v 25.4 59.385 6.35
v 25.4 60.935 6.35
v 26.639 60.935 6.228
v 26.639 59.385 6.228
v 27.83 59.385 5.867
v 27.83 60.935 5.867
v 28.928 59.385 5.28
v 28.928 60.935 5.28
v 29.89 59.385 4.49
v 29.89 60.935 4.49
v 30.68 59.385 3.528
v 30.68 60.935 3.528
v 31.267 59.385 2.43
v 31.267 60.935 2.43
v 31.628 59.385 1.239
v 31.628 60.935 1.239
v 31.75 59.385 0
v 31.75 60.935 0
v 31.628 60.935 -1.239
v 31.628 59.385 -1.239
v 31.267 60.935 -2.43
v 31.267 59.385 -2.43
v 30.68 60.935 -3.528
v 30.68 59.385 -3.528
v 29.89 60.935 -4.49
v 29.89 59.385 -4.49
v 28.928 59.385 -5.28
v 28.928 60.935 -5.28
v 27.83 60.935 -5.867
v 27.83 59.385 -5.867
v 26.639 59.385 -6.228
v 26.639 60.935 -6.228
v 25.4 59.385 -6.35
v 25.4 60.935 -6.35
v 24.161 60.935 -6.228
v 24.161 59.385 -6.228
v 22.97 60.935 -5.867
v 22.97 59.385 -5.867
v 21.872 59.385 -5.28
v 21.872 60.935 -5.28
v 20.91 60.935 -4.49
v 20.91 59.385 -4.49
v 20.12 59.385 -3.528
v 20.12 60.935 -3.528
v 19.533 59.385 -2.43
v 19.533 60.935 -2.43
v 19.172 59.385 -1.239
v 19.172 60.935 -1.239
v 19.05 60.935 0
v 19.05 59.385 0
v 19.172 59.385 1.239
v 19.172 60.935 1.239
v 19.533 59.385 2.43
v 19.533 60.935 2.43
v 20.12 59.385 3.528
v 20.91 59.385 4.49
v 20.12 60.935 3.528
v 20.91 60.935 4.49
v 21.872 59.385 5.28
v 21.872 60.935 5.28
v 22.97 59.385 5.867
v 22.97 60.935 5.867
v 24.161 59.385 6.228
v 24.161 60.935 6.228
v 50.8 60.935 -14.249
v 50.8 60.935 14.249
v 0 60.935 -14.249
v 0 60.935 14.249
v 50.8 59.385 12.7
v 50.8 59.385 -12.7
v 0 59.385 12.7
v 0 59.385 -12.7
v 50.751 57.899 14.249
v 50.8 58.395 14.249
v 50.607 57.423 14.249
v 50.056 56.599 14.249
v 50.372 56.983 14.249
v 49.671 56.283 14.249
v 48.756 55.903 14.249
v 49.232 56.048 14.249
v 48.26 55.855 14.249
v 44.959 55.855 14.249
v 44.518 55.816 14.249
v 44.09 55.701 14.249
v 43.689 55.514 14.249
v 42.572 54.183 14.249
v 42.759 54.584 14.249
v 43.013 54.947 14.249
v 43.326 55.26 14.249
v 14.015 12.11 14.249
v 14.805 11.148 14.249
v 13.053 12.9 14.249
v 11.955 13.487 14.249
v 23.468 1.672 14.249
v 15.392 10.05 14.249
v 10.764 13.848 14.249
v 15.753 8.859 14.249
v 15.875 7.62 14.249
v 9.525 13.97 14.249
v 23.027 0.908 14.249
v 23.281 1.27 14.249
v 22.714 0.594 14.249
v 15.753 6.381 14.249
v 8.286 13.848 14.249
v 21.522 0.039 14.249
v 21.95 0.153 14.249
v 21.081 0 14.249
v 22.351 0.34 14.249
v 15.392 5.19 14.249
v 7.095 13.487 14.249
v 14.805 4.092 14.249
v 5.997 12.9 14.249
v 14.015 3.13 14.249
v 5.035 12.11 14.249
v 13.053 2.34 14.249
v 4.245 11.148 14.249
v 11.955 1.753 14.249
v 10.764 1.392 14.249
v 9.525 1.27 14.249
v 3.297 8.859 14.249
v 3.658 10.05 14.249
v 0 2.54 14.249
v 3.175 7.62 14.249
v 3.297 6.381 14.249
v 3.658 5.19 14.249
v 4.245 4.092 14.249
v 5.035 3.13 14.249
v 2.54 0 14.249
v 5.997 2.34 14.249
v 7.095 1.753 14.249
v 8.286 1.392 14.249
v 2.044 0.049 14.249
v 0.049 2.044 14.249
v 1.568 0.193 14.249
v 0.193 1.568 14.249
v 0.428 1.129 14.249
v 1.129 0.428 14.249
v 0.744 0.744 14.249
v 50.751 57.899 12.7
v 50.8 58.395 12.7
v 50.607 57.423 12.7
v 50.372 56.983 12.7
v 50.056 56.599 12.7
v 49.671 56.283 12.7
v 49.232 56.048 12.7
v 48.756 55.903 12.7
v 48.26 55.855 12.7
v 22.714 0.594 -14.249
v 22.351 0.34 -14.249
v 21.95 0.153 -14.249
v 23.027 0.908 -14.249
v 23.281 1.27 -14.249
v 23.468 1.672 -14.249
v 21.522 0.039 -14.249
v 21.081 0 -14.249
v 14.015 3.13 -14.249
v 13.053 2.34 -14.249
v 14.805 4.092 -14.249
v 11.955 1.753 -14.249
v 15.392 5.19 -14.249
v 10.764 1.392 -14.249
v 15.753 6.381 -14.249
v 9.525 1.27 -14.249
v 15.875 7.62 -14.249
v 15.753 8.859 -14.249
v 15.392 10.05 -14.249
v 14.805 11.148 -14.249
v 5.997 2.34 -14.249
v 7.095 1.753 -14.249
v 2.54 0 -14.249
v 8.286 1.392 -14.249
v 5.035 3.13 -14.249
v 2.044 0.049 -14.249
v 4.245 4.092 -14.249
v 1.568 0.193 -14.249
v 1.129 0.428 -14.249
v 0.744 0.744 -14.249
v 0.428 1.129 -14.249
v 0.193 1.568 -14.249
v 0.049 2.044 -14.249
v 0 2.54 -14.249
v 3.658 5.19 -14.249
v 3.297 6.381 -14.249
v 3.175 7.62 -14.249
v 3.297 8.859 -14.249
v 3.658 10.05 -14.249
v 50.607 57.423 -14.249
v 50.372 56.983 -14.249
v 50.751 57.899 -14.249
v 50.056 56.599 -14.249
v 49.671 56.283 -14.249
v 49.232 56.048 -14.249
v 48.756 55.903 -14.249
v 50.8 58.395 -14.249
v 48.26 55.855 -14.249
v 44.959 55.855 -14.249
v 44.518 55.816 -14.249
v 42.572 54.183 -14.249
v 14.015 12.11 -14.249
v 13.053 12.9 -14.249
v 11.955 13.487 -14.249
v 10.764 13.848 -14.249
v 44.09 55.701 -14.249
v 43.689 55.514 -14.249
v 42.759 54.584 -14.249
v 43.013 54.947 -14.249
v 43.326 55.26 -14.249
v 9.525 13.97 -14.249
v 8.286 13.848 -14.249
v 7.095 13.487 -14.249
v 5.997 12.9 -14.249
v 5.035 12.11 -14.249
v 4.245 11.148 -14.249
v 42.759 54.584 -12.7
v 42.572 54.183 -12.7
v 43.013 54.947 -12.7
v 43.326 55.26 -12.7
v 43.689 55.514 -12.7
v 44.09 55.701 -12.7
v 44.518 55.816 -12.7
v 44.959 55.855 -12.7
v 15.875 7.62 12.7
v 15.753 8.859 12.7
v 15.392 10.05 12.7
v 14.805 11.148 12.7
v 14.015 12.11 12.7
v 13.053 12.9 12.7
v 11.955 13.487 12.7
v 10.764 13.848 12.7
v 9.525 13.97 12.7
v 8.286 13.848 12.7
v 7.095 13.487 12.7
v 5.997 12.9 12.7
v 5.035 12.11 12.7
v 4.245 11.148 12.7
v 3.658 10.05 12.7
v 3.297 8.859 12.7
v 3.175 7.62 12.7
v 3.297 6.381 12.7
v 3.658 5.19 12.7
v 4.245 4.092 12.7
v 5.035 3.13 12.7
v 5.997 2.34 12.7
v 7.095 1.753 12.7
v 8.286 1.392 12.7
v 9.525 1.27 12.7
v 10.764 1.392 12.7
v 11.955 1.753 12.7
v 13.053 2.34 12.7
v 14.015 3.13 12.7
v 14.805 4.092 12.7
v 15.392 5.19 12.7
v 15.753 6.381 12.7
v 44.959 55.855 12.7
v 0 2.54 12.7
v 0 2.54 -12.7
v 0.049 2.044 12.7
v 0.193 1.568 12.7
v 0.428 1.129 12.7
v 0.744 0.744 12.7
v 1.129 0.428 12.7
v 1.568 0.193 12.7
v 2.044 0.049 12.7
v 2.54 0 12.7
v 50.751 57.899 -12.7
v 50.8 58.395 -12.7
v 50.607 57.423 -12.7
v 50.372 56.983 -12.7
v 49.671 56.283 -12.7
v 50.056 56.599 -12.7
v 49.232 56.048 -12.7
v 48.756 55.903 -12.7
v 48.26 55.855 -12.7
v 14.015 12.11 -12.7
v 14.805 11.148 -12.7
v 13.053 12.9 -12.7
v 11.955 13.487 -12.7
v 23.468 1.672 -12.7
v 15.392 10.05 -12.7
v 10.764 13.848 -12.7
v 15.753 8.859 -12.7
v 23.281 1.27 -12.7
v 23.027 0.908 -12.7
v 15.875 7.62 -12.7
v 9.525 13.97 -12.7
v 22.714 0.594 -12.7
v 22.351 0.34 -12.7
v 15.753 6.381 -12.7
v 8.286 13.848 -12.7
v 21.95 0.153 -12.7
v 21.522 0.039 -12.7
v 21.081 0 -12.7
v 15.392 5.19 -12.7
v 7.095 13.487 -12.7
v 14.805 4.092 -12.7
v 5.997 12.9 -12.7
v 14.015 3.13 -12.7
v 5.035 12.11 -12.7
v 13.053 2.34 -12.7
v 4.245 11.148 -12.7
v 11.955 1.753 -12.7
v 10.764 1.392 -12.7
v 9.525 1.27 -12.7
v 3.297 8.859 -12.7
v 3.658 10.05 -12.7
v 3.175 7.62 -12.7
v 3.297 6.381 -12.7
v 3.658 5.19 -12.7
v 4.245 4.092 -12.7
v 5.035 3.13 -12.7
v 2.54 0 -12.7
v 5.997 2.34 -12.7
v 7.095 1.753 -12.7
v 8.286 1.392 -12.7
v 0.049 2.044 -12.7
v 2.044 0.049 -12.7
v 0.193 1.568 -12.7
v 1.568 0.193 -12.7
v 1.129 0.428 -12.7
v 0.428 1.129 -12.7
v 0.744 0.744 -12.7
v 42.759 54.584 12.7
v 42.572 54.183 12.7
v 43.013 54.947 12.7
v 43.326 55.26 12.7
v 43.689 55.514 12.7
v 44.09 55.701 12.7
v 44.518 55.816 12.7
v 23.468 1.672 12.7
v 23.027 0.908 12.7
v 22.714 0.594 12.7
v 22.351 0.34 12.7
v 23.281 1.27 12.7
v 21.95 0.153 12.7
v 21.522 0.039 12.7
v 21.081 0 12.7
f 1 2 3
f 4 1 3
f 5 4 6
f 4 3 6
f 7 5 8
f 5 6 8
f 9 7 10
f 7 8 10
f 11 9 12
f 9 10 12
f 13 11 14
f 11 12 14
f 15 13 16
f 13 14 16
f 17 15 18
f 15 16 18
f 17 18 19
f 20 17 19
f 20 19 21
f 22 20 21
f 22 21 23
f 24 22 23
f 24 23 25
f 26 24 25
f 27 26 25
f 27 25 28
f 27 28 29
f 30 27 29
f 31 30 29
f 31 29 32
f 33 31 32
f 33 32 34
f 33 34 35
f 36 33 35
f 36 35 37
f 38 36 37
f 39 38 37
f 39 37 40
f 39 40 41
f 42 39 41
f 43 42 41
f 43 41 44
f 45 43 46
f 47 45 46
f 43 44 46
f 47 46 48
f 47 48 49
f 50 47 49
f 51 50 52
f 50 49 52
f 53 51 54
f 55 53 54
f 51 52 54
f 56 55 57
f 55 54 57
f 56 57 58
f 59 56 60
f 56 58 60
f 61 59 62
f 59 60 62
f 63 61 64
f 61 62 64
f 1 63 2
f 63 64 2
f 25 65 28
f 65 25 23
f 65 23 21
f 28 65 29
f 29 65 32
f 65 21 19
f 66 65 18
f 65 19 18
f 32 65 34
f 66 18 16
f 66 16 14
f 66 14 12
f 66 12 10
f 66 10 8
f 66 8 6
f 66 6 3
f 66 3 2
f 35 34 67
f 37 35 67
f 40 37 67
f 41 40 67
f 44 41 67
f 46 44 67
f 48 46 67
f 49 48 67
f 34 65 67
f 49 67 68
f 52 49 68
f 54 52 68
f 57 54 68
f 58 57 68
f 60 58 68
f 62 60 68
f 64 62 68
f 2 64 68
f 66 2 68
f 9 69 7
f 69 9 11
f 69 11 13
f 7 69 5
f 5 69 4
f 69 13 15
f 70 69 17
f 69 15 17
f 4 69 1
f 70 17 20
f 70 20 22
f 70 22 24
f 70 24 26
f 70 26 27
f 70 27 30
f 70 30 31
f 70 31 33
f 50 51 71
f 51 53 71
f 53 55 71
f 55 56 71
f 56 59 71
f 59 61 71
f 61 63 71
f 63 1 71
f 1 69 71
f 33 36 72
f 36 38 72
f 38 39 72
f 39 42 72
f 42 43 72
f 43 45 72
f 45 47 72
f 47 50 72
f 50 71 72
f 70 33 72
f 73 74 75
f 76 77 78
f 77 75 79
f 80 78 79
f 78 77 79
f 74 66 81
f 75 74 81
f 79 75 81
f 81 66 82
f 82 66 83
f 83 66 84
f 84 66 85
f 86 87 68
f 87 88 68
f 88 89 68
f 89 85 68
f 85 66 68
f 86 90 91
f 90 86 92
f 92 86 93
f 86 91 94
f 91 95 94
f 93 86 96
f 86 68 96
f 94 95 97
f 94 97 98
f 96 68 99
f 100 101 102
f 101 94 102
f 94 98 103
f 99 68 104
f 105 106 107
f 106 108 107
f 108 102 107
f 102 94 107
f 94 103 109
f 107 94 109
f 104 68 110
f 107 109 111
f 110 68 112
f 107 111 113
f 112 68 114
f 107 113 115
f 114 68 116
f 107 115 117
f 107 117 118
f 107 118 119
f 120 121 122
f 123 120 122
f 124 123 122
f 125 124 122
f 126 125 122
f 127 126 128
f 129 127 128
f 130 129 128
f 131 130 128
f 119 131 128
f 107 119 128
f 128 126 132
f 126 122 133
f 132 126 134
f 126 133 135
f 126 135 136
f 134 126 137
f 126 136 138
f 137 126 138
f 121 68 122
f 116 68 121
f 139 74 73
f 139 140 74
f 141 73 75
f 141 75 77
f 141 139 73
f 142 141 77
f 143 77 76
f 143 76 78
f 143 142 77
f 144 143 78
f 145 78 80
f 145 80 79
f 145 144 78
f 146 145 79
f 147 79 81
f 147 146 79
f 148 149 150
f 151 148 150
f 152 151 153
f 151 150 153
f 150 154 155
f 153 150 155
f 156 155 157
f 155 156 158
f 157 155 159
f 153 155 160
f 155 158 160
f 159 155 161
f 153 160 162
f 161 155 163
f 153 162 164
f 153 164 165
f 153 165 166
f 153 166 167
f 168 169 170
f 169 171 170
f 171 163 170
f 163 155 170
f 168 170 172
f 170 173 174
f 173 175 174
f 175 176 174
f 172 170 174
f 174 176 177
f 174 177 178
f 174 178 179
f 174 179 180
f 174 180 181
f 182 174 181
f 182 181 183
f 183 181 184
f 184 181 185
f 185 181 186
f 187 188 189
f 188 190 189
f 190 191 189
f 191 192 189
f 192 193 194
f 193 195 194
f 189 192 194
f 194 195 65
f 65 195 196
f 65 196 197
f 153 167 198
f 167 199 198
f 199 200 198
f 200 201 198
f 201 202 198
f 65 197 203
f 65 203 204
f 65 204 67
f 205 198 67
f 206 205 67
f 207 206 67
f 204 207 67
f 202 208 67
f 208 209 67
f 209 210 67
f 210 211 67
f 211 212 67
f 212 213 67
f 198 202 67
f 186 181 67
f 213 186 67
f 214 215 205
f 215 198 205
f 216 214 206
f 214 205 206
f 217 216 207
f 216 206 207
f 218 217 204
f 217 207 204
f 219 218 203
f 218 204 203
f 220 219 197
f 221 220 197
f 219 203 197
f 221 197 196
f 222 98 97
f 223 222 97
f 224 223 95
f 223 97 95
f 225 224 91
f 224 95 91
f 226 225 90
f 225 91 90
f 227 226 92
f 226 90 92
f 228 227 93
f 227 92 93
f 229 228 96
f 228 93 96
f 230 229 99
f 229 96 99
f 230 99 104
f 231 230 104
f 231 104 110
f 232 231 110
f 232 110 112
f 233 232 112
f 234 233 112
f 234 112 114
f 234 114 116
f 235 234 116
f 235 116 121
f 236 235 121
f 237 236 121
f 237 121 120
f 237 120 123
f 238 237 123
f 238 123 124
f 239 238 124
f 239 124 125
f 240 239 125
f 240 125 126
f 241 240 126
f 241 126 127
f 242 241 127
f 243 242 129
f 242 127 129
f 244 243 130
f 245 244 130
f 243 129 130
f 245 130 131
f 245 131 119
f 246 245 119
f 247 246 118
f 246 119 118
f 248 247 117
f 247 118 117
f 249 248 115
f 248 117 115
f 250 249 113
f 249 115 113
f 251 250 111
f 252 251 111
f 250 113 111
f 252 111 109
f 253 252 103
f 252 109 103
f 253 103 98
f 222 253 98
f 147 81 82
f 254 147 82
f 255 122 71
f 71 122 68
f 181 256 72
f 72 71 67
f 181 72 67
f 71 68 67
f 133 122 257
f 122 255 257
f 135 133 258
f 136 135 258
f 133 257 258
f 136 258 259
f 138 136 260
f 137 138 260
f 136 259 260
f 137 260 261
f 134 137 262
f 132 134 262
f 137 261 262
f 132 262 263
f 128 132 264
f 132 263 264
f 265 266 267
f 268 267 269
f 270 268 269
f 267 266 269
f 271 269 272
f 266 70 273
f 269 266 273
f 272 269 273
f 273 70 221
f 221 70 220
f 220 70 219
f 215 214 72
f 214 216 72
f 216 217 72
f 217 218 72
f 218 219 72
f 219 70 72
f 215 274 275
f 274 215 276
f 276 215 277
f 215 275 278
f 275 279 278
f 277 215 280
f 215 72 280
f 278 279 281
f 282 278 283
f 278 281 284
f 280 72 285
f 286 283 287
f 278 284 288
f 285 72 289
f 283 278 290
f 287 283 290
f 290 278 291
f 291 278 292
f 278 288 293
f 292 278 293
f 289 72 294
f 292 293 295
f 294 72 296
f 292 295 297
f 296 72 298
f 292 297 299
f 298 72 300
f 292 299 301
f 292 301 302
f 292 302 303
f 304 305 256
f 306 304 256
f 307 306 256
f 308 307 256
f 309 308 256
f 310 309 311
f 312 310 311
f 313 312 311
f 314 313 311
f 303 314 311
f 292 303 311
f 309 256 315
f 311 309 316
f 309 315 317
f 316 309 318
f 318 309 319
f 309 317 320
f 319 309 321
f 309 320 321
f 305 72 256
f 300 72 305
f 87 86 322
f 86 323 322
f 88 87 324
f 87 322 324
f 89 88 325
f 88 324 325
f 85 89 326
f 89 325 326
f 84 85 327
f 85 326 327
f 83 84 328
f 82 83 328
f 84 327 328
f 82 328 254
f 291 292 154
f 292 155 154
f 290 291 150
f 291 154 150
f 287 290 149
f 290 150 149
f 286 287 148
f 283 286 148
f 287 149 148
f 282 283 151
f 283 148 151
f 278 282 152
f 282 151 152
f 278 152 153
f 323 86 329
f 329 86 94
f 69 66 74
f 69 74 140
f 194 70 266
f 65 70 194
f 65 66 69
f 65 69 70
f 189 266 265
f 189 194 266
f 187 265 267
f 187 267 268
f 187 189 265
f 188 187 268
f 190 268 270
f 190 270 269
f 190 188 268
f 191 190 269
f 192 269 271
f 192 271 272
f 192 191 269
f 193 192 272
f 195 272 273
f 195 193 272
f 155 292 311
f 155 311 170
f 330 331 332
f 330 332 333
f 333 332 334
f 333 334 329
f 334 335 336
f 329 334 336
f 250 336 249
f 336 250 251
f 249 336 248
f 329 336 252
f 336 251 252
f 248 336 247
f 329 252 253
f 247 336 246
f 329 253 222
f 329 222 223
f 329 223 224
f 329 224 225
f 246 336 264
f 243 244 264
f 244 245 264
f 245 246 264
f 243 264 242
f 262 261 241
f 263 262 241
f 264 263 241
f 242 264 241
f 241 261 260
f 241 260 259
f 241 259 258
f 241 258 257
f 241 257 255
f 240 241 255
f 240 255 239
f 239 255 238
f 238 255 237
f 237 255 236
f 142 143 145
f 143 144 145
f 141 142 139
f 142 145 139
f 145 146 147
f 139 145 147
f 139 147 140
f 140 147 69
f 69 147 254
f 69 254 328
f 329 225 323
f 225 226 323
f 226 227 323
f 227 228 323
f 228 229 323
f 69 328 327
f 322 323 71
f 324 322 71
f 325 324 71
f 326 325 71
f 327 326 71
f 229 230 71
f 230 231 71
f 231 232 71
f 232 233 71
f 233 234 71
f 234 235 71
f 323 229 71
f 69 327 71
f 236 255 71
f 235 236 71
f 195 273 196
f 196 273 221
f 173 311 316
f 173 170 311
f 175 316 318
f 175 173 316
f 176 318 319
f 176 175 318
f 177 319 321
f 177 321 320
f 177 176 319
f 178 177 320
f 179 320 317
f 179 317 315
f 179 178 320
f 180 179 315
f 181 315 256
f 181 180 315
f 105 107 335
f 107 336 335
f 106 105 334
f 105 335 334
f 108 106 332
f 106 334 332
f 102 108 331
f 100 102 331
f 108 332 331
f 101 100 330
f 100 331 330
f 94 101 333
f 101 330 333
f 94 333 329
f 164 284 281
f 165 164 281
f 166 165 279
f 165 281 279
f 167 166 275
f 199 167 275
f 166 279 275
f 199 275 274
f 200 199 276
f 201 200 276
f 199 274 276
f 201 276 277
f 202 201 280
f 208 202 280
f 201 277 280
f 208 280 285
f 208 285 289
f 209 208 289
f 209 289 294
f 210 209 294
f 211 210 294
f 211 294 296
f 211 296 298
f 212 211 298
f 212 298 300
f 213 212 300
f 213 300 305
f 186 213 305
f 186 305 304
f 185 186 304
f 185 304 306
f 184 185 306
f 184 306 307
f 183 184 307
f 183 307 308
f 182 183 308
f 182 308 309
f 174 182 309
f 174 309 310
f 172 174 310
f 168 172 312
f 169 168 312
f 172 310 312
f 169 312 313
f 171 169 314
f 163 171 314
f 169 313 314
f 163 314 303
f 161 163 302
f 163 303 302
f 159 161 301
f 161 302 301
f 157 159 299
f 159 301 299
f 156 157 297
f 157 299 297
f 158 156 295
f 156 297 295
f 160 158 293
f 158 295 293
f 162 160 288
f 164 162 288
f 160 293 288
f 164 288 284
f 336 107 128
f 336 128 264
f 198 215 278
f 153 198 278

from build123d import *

# Parameters (mm, degrees)
BOSS_EXTRUDE1_DEPTH = 50.8
SKETCH2_R           = 6.35
CUT_EXTRUDE1_DEPTH  = 85.29618662
FILLET1_R           = 2.54
CUT_EXTRUDE2_REACH  = 82.602
SKETCH3_R           = 6.35


with BuildPart() as part:
    # Sketch1 → Boss-Extrude1 (new body)
    with BuildSketch(Plane(origin=(0, 0, 0), x_dir=(0, 0, -1), z_dir=(1, 0, 0))):
        Polygon((12.7, 0), (14.2494, 0), (14.2494, 60.9346), (-14.2494, 60.9346), (-14.2494, 0), (-12.7, 0), (-12.7, 59.3852), (12.7, 59.3852), align=None)
    extrude(amount=BOSS_EXTRUDE1_DEPTH)

    # Sketch2 → Cut-Extrude1 (cut, through all)
    with BuildSketch(Plane.XY.offset(14.2494)):
        with Locations((9.525, 7.62)):
            Circle(SKETCH2_R)
        Polygon((22.86, 0), (50.8, 0), (50.8, 55.8546), (43.18, 55.8546), align=None)
    extrude(amount=-CUT_EXTRUDE1_DEPTH, mode=Mode.SUBTRACT)

    # Fillet1
    fillet1_edges = [part.edges().sort_by_distance(p)[0] for p in [
        (0, 0, -13.4747),
        (50.8, 55.8546, 13.4747),
        (50.8, 55.8546, -13.4747),
        (22.86, 0, -13.4747),
        (22.86, 0, 13.4747),
        (43.18, 55.8546, -13.4747),
        (43.18, 55.8546, 13.4747),
        (0, 0, 13.4747),
    ]]
    fillet(fillet1_edges, radius=FILLET1_R)

    # Sketch3 → Cut-Extrude2 (cut, up to next)
    with BuildSketch(Plane(origin=(0, 60.9346, 0), x_dir=(1, 0, 0), z_dir=(0, 1, 0)), mode=Mode.PRIVATE) as cut_extrude2_sk1:
        with Locations(Location((25.4, 0, 0), (0, 0, 270))):
            Circle(SKETCH3_R)
    cut_extrude2_tool1 = extrude(cut_extrude2_sk1.sketch, amount=-CUT_EXTRUDE2_REACH, mode=Mode.PRIVATE) & part.part
    add(cut_extrude2_tool1.solids().sort_by_distance((25.4, 60.9346, 0))[0], mode=Mode.SUBTRACT)


solid = part.part
